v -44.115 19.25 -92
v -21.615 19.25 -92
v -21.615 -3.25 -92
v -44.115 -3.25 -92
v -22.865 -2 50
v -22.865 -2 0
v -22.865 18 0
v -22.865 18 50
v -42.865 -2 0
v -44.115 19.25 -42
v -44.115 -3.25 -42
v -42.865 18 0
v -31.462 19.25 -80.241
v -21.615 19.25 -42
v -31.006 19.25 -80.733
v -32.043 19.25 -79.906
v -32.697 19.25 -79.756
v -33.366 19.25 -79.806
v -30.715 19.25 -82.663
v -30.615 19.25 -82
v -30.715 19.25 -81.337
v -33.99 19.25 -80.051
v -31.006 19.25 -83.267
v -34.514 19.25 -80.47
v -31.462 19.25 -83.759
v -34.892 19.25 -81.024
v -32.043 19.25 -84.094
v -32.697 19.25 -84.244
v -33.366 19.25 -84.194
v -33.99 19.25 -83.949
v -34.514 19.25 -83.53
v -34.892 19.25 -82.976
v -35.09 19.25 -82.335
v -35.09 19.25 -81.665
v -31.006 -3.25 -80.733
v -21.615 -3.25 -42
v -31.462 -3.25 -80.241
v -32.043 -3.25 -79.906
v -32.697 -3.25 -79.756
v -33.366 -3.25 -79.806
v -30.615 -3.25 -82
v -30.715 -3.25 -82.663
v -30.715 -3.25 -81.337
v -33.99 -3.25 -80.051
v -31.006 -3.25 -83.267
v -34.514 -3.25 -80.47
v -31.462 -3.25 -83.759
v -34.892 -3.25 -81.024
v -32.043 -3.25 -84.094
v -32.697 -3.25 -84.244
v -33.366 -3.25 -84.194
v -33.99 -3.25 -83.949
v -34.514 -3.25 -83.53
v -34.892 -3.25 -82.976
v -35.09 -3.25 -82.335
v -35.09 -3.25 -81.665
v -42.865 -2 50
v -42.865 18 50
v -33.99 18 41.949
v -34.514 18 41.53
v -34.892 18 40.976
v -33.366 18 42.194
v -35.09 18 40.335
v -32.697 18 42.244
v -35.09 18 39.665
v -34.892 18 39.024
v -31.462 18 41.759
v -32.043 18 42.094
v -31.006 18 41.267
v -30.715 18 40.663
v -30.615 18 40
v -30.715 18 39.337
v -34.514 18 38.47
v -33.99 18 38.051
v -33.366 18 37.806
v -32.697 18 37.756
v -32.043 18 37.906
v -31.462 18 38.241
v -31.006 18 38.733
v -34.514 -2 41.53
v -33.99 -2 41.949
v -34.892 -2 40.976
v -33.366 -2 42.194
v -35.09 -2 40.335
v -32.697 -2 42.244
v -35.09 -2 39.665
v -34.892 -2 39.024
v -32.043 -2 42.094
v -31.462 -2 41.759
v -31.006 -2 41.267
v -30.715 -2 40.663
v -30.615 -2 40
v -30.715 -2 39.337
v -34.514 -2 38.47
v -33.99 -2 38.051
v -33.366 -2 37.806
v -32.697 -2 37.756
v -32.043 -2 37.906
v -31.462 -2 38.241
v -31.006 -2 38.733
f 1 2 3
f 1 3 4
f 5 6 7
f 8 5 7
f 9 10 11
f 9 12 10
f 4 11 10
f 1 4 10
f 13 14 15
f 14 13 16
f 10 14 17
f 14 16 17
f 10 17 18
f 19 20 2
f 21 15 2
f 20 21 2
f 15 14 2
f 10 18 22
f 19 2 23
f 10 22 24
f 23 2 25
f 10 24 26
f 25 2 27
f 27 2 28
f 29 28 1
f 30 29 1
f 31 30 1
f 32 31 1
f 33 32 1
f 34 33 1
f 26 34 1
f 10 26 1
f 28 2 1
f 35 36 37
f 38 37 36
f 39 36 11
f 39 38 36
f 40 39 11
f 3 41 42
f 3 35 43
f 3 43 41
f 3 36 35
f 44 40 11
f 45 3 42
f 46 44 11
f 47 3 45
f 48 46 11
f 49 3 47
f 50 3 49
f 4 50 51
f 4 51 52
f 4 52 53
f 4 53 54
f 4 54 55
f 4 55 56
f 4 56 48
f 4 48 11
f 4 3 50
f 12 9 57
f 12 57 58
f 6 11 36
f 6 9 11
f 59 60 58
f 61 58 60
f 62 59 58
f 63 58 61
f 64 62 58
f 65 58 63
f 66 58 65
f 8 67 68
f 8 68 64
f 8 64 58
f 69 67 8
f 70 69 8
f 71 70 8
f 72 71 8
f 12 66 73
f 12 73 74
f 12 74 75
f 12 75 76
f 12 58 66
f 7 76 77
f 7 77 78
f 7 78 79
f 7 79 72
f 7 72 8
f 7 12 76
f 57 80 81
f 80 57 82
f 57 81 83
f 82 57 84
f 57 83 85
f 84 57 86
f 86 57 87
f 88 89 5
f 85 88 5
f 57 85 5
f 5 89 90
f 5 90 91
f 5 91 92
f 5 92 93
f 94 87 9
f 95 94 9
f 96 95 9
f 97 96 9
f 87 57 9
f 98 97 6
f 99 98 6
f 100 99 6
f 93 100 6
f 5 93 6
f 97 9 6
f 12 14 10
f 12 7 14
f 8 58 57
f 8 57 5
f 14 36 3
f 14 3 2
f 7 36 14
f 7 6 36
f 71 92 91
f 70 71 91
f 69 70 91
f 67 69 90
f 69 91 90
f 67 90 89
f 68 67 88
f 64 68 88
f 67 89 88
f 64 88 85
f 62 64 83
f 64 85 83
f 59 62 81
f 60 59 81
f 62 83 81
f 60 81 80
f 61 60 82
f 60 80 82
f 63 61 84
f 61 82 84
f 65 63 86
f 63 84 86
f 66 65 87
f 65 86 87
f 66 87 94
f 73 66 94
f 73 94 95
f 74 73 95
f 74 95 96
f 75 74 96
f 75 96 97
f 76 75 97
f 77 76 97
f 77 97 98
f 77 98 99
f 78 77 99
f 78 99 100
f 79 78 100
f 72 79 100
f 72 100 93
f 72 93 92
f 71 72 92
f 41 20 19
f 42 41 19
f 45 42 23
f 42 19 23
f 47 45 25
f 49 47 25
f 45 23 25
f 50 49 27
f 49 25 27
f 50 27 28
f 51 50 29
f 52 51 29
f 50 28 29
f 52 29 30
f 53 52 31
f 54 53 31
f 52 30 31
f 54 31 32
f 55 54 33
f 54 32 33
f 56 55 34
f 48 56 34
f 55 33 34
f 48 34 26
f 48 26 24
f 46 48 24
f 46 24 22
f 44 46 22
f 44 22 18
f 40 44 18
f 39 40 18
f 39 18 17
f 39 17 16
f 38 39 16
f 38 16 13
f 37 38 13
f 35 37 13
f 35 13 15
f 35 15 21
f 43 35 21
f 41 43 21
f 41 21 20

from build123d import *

# Parameters (mm, degrees)
ESQUISSE1_W             = 20
ESQUISSE1_H             = 20
BOSS_EXTRU_1_DEPTH      = 50
ESQUISSE2_W             = 22.5
ESQUISSE2_H             = 22.5
BOSS_EXTRU_2_DEPTH      = 50
ESQUISSE5_W             = 22.5
ESQUISSE5_H             = 22.5
ESQUISSE4_W             = 20
ESQUISSE4_H             = 20
ENL_V_MAT_EXTRU_1_REACH = 24.5
ESQUISSE6_R             = 2.25
ENL_V_MAT_EXTRU_2_REACH = 23.25
ESQUISSE7_R             = 2.25


with BuildPart() as part:
    # Esquisse1 → Boss.-Extru.1 (new body)
    with BuildSketch(Plane.XY):
        with Locations((-32.865009747, 8)):
            Rectangle(ESQUISSE1_W, ESQUISSE1_H)
    extrude(amount=BOSS_EXTRU_1_DEPTH)



with BuildPart() as body_2:
    # Esquisse2 → Boss.-Extru.2 (new body)
    with BuildSketch(Plane(origin=(0, 0, -92), x_dir=(-1, 0, 0), z_dir=(0, 0, -1))):
        with Locations((32.865009747, 8)):
            Rectangle(ESQUISSE2_W, ESQUISSE2_H)
    extrude(amount=-BOSS_EXTRU_2_DEPTH)


with BuildPart() as part_1:
    add(part.part)

    add(body_2.part)  # Lissage1 merges body 2
    # Esquisse5 → Lissage1 section 0
    with BuildSketch(Plane.XY.offset(-42)):
        with Locations((-32.865009747, 8)):
            Rectangle(ESQUISSE5_W, ESQUISSE5_H)
    # Esquisse4 → Lissage1 section 1
    with BuildSketch(Plane(origin=(0, 0, 0), x_dir=(-1, 0, 0), z_dir=(0, 0, -1))):
        with Locations((32.865009747, 8)):
            Rectangle(ESQUISSE4_W, ESQUISSE4_H)
    loft()

    # Esquisse6 → Enlèv. mat.-Extru.1 (cut, up to next)
    with BuildSketch(Plane(origin=(0, 19.25, 0), x_dir=(1, 0, 0), z_dir=(0, 1, 0)), mode=Mode.PRIVATE) as enl_v_mat_extru_1_sk1:
        with Locations((-32.865009747, 82)):
            Circle(ESQUISSE6_R)
    enl_v_mat_extru_1_tool1 = extrude(enl_v_mat_extru_1_sk1.sketch, amount=-ENL_V_MAT_EXTRU_1_REACH, mode=Mode.PRIVATE) & part_1.part
    add(enl_v_mat_extru_1_tool1.solids().sort_by_distance((-32.86501, 19.25, -82))[0], mode=Mode.SUBTRACT)

    # Esquisse7 → Enlèv. mat.-Extru.2 (cut, up to next)
    with BuildSketch(Plane.XZ.offset(2), mode=Mode.PRIVATE) as enl_v_mat_extru_2_sk1:
        with Locations((-32.865009747, 40)):
            Circle(ESQUISSE7_R)
    enl_v_mat_extru_2_tool1 = extrude(enl_v_mat_extru_2_sk1.sketch, amount=-ENL_V_MAT_EXTRU_2_REACH, mode=Mode.PRIVATE) & part_1.part
    add(enl_v_mat_extru_2_tool1.solids().sort_by_distance((-32.86501, -2, 40))[0], mode=Mode.SUBTRACT)


solid = part_1.part
